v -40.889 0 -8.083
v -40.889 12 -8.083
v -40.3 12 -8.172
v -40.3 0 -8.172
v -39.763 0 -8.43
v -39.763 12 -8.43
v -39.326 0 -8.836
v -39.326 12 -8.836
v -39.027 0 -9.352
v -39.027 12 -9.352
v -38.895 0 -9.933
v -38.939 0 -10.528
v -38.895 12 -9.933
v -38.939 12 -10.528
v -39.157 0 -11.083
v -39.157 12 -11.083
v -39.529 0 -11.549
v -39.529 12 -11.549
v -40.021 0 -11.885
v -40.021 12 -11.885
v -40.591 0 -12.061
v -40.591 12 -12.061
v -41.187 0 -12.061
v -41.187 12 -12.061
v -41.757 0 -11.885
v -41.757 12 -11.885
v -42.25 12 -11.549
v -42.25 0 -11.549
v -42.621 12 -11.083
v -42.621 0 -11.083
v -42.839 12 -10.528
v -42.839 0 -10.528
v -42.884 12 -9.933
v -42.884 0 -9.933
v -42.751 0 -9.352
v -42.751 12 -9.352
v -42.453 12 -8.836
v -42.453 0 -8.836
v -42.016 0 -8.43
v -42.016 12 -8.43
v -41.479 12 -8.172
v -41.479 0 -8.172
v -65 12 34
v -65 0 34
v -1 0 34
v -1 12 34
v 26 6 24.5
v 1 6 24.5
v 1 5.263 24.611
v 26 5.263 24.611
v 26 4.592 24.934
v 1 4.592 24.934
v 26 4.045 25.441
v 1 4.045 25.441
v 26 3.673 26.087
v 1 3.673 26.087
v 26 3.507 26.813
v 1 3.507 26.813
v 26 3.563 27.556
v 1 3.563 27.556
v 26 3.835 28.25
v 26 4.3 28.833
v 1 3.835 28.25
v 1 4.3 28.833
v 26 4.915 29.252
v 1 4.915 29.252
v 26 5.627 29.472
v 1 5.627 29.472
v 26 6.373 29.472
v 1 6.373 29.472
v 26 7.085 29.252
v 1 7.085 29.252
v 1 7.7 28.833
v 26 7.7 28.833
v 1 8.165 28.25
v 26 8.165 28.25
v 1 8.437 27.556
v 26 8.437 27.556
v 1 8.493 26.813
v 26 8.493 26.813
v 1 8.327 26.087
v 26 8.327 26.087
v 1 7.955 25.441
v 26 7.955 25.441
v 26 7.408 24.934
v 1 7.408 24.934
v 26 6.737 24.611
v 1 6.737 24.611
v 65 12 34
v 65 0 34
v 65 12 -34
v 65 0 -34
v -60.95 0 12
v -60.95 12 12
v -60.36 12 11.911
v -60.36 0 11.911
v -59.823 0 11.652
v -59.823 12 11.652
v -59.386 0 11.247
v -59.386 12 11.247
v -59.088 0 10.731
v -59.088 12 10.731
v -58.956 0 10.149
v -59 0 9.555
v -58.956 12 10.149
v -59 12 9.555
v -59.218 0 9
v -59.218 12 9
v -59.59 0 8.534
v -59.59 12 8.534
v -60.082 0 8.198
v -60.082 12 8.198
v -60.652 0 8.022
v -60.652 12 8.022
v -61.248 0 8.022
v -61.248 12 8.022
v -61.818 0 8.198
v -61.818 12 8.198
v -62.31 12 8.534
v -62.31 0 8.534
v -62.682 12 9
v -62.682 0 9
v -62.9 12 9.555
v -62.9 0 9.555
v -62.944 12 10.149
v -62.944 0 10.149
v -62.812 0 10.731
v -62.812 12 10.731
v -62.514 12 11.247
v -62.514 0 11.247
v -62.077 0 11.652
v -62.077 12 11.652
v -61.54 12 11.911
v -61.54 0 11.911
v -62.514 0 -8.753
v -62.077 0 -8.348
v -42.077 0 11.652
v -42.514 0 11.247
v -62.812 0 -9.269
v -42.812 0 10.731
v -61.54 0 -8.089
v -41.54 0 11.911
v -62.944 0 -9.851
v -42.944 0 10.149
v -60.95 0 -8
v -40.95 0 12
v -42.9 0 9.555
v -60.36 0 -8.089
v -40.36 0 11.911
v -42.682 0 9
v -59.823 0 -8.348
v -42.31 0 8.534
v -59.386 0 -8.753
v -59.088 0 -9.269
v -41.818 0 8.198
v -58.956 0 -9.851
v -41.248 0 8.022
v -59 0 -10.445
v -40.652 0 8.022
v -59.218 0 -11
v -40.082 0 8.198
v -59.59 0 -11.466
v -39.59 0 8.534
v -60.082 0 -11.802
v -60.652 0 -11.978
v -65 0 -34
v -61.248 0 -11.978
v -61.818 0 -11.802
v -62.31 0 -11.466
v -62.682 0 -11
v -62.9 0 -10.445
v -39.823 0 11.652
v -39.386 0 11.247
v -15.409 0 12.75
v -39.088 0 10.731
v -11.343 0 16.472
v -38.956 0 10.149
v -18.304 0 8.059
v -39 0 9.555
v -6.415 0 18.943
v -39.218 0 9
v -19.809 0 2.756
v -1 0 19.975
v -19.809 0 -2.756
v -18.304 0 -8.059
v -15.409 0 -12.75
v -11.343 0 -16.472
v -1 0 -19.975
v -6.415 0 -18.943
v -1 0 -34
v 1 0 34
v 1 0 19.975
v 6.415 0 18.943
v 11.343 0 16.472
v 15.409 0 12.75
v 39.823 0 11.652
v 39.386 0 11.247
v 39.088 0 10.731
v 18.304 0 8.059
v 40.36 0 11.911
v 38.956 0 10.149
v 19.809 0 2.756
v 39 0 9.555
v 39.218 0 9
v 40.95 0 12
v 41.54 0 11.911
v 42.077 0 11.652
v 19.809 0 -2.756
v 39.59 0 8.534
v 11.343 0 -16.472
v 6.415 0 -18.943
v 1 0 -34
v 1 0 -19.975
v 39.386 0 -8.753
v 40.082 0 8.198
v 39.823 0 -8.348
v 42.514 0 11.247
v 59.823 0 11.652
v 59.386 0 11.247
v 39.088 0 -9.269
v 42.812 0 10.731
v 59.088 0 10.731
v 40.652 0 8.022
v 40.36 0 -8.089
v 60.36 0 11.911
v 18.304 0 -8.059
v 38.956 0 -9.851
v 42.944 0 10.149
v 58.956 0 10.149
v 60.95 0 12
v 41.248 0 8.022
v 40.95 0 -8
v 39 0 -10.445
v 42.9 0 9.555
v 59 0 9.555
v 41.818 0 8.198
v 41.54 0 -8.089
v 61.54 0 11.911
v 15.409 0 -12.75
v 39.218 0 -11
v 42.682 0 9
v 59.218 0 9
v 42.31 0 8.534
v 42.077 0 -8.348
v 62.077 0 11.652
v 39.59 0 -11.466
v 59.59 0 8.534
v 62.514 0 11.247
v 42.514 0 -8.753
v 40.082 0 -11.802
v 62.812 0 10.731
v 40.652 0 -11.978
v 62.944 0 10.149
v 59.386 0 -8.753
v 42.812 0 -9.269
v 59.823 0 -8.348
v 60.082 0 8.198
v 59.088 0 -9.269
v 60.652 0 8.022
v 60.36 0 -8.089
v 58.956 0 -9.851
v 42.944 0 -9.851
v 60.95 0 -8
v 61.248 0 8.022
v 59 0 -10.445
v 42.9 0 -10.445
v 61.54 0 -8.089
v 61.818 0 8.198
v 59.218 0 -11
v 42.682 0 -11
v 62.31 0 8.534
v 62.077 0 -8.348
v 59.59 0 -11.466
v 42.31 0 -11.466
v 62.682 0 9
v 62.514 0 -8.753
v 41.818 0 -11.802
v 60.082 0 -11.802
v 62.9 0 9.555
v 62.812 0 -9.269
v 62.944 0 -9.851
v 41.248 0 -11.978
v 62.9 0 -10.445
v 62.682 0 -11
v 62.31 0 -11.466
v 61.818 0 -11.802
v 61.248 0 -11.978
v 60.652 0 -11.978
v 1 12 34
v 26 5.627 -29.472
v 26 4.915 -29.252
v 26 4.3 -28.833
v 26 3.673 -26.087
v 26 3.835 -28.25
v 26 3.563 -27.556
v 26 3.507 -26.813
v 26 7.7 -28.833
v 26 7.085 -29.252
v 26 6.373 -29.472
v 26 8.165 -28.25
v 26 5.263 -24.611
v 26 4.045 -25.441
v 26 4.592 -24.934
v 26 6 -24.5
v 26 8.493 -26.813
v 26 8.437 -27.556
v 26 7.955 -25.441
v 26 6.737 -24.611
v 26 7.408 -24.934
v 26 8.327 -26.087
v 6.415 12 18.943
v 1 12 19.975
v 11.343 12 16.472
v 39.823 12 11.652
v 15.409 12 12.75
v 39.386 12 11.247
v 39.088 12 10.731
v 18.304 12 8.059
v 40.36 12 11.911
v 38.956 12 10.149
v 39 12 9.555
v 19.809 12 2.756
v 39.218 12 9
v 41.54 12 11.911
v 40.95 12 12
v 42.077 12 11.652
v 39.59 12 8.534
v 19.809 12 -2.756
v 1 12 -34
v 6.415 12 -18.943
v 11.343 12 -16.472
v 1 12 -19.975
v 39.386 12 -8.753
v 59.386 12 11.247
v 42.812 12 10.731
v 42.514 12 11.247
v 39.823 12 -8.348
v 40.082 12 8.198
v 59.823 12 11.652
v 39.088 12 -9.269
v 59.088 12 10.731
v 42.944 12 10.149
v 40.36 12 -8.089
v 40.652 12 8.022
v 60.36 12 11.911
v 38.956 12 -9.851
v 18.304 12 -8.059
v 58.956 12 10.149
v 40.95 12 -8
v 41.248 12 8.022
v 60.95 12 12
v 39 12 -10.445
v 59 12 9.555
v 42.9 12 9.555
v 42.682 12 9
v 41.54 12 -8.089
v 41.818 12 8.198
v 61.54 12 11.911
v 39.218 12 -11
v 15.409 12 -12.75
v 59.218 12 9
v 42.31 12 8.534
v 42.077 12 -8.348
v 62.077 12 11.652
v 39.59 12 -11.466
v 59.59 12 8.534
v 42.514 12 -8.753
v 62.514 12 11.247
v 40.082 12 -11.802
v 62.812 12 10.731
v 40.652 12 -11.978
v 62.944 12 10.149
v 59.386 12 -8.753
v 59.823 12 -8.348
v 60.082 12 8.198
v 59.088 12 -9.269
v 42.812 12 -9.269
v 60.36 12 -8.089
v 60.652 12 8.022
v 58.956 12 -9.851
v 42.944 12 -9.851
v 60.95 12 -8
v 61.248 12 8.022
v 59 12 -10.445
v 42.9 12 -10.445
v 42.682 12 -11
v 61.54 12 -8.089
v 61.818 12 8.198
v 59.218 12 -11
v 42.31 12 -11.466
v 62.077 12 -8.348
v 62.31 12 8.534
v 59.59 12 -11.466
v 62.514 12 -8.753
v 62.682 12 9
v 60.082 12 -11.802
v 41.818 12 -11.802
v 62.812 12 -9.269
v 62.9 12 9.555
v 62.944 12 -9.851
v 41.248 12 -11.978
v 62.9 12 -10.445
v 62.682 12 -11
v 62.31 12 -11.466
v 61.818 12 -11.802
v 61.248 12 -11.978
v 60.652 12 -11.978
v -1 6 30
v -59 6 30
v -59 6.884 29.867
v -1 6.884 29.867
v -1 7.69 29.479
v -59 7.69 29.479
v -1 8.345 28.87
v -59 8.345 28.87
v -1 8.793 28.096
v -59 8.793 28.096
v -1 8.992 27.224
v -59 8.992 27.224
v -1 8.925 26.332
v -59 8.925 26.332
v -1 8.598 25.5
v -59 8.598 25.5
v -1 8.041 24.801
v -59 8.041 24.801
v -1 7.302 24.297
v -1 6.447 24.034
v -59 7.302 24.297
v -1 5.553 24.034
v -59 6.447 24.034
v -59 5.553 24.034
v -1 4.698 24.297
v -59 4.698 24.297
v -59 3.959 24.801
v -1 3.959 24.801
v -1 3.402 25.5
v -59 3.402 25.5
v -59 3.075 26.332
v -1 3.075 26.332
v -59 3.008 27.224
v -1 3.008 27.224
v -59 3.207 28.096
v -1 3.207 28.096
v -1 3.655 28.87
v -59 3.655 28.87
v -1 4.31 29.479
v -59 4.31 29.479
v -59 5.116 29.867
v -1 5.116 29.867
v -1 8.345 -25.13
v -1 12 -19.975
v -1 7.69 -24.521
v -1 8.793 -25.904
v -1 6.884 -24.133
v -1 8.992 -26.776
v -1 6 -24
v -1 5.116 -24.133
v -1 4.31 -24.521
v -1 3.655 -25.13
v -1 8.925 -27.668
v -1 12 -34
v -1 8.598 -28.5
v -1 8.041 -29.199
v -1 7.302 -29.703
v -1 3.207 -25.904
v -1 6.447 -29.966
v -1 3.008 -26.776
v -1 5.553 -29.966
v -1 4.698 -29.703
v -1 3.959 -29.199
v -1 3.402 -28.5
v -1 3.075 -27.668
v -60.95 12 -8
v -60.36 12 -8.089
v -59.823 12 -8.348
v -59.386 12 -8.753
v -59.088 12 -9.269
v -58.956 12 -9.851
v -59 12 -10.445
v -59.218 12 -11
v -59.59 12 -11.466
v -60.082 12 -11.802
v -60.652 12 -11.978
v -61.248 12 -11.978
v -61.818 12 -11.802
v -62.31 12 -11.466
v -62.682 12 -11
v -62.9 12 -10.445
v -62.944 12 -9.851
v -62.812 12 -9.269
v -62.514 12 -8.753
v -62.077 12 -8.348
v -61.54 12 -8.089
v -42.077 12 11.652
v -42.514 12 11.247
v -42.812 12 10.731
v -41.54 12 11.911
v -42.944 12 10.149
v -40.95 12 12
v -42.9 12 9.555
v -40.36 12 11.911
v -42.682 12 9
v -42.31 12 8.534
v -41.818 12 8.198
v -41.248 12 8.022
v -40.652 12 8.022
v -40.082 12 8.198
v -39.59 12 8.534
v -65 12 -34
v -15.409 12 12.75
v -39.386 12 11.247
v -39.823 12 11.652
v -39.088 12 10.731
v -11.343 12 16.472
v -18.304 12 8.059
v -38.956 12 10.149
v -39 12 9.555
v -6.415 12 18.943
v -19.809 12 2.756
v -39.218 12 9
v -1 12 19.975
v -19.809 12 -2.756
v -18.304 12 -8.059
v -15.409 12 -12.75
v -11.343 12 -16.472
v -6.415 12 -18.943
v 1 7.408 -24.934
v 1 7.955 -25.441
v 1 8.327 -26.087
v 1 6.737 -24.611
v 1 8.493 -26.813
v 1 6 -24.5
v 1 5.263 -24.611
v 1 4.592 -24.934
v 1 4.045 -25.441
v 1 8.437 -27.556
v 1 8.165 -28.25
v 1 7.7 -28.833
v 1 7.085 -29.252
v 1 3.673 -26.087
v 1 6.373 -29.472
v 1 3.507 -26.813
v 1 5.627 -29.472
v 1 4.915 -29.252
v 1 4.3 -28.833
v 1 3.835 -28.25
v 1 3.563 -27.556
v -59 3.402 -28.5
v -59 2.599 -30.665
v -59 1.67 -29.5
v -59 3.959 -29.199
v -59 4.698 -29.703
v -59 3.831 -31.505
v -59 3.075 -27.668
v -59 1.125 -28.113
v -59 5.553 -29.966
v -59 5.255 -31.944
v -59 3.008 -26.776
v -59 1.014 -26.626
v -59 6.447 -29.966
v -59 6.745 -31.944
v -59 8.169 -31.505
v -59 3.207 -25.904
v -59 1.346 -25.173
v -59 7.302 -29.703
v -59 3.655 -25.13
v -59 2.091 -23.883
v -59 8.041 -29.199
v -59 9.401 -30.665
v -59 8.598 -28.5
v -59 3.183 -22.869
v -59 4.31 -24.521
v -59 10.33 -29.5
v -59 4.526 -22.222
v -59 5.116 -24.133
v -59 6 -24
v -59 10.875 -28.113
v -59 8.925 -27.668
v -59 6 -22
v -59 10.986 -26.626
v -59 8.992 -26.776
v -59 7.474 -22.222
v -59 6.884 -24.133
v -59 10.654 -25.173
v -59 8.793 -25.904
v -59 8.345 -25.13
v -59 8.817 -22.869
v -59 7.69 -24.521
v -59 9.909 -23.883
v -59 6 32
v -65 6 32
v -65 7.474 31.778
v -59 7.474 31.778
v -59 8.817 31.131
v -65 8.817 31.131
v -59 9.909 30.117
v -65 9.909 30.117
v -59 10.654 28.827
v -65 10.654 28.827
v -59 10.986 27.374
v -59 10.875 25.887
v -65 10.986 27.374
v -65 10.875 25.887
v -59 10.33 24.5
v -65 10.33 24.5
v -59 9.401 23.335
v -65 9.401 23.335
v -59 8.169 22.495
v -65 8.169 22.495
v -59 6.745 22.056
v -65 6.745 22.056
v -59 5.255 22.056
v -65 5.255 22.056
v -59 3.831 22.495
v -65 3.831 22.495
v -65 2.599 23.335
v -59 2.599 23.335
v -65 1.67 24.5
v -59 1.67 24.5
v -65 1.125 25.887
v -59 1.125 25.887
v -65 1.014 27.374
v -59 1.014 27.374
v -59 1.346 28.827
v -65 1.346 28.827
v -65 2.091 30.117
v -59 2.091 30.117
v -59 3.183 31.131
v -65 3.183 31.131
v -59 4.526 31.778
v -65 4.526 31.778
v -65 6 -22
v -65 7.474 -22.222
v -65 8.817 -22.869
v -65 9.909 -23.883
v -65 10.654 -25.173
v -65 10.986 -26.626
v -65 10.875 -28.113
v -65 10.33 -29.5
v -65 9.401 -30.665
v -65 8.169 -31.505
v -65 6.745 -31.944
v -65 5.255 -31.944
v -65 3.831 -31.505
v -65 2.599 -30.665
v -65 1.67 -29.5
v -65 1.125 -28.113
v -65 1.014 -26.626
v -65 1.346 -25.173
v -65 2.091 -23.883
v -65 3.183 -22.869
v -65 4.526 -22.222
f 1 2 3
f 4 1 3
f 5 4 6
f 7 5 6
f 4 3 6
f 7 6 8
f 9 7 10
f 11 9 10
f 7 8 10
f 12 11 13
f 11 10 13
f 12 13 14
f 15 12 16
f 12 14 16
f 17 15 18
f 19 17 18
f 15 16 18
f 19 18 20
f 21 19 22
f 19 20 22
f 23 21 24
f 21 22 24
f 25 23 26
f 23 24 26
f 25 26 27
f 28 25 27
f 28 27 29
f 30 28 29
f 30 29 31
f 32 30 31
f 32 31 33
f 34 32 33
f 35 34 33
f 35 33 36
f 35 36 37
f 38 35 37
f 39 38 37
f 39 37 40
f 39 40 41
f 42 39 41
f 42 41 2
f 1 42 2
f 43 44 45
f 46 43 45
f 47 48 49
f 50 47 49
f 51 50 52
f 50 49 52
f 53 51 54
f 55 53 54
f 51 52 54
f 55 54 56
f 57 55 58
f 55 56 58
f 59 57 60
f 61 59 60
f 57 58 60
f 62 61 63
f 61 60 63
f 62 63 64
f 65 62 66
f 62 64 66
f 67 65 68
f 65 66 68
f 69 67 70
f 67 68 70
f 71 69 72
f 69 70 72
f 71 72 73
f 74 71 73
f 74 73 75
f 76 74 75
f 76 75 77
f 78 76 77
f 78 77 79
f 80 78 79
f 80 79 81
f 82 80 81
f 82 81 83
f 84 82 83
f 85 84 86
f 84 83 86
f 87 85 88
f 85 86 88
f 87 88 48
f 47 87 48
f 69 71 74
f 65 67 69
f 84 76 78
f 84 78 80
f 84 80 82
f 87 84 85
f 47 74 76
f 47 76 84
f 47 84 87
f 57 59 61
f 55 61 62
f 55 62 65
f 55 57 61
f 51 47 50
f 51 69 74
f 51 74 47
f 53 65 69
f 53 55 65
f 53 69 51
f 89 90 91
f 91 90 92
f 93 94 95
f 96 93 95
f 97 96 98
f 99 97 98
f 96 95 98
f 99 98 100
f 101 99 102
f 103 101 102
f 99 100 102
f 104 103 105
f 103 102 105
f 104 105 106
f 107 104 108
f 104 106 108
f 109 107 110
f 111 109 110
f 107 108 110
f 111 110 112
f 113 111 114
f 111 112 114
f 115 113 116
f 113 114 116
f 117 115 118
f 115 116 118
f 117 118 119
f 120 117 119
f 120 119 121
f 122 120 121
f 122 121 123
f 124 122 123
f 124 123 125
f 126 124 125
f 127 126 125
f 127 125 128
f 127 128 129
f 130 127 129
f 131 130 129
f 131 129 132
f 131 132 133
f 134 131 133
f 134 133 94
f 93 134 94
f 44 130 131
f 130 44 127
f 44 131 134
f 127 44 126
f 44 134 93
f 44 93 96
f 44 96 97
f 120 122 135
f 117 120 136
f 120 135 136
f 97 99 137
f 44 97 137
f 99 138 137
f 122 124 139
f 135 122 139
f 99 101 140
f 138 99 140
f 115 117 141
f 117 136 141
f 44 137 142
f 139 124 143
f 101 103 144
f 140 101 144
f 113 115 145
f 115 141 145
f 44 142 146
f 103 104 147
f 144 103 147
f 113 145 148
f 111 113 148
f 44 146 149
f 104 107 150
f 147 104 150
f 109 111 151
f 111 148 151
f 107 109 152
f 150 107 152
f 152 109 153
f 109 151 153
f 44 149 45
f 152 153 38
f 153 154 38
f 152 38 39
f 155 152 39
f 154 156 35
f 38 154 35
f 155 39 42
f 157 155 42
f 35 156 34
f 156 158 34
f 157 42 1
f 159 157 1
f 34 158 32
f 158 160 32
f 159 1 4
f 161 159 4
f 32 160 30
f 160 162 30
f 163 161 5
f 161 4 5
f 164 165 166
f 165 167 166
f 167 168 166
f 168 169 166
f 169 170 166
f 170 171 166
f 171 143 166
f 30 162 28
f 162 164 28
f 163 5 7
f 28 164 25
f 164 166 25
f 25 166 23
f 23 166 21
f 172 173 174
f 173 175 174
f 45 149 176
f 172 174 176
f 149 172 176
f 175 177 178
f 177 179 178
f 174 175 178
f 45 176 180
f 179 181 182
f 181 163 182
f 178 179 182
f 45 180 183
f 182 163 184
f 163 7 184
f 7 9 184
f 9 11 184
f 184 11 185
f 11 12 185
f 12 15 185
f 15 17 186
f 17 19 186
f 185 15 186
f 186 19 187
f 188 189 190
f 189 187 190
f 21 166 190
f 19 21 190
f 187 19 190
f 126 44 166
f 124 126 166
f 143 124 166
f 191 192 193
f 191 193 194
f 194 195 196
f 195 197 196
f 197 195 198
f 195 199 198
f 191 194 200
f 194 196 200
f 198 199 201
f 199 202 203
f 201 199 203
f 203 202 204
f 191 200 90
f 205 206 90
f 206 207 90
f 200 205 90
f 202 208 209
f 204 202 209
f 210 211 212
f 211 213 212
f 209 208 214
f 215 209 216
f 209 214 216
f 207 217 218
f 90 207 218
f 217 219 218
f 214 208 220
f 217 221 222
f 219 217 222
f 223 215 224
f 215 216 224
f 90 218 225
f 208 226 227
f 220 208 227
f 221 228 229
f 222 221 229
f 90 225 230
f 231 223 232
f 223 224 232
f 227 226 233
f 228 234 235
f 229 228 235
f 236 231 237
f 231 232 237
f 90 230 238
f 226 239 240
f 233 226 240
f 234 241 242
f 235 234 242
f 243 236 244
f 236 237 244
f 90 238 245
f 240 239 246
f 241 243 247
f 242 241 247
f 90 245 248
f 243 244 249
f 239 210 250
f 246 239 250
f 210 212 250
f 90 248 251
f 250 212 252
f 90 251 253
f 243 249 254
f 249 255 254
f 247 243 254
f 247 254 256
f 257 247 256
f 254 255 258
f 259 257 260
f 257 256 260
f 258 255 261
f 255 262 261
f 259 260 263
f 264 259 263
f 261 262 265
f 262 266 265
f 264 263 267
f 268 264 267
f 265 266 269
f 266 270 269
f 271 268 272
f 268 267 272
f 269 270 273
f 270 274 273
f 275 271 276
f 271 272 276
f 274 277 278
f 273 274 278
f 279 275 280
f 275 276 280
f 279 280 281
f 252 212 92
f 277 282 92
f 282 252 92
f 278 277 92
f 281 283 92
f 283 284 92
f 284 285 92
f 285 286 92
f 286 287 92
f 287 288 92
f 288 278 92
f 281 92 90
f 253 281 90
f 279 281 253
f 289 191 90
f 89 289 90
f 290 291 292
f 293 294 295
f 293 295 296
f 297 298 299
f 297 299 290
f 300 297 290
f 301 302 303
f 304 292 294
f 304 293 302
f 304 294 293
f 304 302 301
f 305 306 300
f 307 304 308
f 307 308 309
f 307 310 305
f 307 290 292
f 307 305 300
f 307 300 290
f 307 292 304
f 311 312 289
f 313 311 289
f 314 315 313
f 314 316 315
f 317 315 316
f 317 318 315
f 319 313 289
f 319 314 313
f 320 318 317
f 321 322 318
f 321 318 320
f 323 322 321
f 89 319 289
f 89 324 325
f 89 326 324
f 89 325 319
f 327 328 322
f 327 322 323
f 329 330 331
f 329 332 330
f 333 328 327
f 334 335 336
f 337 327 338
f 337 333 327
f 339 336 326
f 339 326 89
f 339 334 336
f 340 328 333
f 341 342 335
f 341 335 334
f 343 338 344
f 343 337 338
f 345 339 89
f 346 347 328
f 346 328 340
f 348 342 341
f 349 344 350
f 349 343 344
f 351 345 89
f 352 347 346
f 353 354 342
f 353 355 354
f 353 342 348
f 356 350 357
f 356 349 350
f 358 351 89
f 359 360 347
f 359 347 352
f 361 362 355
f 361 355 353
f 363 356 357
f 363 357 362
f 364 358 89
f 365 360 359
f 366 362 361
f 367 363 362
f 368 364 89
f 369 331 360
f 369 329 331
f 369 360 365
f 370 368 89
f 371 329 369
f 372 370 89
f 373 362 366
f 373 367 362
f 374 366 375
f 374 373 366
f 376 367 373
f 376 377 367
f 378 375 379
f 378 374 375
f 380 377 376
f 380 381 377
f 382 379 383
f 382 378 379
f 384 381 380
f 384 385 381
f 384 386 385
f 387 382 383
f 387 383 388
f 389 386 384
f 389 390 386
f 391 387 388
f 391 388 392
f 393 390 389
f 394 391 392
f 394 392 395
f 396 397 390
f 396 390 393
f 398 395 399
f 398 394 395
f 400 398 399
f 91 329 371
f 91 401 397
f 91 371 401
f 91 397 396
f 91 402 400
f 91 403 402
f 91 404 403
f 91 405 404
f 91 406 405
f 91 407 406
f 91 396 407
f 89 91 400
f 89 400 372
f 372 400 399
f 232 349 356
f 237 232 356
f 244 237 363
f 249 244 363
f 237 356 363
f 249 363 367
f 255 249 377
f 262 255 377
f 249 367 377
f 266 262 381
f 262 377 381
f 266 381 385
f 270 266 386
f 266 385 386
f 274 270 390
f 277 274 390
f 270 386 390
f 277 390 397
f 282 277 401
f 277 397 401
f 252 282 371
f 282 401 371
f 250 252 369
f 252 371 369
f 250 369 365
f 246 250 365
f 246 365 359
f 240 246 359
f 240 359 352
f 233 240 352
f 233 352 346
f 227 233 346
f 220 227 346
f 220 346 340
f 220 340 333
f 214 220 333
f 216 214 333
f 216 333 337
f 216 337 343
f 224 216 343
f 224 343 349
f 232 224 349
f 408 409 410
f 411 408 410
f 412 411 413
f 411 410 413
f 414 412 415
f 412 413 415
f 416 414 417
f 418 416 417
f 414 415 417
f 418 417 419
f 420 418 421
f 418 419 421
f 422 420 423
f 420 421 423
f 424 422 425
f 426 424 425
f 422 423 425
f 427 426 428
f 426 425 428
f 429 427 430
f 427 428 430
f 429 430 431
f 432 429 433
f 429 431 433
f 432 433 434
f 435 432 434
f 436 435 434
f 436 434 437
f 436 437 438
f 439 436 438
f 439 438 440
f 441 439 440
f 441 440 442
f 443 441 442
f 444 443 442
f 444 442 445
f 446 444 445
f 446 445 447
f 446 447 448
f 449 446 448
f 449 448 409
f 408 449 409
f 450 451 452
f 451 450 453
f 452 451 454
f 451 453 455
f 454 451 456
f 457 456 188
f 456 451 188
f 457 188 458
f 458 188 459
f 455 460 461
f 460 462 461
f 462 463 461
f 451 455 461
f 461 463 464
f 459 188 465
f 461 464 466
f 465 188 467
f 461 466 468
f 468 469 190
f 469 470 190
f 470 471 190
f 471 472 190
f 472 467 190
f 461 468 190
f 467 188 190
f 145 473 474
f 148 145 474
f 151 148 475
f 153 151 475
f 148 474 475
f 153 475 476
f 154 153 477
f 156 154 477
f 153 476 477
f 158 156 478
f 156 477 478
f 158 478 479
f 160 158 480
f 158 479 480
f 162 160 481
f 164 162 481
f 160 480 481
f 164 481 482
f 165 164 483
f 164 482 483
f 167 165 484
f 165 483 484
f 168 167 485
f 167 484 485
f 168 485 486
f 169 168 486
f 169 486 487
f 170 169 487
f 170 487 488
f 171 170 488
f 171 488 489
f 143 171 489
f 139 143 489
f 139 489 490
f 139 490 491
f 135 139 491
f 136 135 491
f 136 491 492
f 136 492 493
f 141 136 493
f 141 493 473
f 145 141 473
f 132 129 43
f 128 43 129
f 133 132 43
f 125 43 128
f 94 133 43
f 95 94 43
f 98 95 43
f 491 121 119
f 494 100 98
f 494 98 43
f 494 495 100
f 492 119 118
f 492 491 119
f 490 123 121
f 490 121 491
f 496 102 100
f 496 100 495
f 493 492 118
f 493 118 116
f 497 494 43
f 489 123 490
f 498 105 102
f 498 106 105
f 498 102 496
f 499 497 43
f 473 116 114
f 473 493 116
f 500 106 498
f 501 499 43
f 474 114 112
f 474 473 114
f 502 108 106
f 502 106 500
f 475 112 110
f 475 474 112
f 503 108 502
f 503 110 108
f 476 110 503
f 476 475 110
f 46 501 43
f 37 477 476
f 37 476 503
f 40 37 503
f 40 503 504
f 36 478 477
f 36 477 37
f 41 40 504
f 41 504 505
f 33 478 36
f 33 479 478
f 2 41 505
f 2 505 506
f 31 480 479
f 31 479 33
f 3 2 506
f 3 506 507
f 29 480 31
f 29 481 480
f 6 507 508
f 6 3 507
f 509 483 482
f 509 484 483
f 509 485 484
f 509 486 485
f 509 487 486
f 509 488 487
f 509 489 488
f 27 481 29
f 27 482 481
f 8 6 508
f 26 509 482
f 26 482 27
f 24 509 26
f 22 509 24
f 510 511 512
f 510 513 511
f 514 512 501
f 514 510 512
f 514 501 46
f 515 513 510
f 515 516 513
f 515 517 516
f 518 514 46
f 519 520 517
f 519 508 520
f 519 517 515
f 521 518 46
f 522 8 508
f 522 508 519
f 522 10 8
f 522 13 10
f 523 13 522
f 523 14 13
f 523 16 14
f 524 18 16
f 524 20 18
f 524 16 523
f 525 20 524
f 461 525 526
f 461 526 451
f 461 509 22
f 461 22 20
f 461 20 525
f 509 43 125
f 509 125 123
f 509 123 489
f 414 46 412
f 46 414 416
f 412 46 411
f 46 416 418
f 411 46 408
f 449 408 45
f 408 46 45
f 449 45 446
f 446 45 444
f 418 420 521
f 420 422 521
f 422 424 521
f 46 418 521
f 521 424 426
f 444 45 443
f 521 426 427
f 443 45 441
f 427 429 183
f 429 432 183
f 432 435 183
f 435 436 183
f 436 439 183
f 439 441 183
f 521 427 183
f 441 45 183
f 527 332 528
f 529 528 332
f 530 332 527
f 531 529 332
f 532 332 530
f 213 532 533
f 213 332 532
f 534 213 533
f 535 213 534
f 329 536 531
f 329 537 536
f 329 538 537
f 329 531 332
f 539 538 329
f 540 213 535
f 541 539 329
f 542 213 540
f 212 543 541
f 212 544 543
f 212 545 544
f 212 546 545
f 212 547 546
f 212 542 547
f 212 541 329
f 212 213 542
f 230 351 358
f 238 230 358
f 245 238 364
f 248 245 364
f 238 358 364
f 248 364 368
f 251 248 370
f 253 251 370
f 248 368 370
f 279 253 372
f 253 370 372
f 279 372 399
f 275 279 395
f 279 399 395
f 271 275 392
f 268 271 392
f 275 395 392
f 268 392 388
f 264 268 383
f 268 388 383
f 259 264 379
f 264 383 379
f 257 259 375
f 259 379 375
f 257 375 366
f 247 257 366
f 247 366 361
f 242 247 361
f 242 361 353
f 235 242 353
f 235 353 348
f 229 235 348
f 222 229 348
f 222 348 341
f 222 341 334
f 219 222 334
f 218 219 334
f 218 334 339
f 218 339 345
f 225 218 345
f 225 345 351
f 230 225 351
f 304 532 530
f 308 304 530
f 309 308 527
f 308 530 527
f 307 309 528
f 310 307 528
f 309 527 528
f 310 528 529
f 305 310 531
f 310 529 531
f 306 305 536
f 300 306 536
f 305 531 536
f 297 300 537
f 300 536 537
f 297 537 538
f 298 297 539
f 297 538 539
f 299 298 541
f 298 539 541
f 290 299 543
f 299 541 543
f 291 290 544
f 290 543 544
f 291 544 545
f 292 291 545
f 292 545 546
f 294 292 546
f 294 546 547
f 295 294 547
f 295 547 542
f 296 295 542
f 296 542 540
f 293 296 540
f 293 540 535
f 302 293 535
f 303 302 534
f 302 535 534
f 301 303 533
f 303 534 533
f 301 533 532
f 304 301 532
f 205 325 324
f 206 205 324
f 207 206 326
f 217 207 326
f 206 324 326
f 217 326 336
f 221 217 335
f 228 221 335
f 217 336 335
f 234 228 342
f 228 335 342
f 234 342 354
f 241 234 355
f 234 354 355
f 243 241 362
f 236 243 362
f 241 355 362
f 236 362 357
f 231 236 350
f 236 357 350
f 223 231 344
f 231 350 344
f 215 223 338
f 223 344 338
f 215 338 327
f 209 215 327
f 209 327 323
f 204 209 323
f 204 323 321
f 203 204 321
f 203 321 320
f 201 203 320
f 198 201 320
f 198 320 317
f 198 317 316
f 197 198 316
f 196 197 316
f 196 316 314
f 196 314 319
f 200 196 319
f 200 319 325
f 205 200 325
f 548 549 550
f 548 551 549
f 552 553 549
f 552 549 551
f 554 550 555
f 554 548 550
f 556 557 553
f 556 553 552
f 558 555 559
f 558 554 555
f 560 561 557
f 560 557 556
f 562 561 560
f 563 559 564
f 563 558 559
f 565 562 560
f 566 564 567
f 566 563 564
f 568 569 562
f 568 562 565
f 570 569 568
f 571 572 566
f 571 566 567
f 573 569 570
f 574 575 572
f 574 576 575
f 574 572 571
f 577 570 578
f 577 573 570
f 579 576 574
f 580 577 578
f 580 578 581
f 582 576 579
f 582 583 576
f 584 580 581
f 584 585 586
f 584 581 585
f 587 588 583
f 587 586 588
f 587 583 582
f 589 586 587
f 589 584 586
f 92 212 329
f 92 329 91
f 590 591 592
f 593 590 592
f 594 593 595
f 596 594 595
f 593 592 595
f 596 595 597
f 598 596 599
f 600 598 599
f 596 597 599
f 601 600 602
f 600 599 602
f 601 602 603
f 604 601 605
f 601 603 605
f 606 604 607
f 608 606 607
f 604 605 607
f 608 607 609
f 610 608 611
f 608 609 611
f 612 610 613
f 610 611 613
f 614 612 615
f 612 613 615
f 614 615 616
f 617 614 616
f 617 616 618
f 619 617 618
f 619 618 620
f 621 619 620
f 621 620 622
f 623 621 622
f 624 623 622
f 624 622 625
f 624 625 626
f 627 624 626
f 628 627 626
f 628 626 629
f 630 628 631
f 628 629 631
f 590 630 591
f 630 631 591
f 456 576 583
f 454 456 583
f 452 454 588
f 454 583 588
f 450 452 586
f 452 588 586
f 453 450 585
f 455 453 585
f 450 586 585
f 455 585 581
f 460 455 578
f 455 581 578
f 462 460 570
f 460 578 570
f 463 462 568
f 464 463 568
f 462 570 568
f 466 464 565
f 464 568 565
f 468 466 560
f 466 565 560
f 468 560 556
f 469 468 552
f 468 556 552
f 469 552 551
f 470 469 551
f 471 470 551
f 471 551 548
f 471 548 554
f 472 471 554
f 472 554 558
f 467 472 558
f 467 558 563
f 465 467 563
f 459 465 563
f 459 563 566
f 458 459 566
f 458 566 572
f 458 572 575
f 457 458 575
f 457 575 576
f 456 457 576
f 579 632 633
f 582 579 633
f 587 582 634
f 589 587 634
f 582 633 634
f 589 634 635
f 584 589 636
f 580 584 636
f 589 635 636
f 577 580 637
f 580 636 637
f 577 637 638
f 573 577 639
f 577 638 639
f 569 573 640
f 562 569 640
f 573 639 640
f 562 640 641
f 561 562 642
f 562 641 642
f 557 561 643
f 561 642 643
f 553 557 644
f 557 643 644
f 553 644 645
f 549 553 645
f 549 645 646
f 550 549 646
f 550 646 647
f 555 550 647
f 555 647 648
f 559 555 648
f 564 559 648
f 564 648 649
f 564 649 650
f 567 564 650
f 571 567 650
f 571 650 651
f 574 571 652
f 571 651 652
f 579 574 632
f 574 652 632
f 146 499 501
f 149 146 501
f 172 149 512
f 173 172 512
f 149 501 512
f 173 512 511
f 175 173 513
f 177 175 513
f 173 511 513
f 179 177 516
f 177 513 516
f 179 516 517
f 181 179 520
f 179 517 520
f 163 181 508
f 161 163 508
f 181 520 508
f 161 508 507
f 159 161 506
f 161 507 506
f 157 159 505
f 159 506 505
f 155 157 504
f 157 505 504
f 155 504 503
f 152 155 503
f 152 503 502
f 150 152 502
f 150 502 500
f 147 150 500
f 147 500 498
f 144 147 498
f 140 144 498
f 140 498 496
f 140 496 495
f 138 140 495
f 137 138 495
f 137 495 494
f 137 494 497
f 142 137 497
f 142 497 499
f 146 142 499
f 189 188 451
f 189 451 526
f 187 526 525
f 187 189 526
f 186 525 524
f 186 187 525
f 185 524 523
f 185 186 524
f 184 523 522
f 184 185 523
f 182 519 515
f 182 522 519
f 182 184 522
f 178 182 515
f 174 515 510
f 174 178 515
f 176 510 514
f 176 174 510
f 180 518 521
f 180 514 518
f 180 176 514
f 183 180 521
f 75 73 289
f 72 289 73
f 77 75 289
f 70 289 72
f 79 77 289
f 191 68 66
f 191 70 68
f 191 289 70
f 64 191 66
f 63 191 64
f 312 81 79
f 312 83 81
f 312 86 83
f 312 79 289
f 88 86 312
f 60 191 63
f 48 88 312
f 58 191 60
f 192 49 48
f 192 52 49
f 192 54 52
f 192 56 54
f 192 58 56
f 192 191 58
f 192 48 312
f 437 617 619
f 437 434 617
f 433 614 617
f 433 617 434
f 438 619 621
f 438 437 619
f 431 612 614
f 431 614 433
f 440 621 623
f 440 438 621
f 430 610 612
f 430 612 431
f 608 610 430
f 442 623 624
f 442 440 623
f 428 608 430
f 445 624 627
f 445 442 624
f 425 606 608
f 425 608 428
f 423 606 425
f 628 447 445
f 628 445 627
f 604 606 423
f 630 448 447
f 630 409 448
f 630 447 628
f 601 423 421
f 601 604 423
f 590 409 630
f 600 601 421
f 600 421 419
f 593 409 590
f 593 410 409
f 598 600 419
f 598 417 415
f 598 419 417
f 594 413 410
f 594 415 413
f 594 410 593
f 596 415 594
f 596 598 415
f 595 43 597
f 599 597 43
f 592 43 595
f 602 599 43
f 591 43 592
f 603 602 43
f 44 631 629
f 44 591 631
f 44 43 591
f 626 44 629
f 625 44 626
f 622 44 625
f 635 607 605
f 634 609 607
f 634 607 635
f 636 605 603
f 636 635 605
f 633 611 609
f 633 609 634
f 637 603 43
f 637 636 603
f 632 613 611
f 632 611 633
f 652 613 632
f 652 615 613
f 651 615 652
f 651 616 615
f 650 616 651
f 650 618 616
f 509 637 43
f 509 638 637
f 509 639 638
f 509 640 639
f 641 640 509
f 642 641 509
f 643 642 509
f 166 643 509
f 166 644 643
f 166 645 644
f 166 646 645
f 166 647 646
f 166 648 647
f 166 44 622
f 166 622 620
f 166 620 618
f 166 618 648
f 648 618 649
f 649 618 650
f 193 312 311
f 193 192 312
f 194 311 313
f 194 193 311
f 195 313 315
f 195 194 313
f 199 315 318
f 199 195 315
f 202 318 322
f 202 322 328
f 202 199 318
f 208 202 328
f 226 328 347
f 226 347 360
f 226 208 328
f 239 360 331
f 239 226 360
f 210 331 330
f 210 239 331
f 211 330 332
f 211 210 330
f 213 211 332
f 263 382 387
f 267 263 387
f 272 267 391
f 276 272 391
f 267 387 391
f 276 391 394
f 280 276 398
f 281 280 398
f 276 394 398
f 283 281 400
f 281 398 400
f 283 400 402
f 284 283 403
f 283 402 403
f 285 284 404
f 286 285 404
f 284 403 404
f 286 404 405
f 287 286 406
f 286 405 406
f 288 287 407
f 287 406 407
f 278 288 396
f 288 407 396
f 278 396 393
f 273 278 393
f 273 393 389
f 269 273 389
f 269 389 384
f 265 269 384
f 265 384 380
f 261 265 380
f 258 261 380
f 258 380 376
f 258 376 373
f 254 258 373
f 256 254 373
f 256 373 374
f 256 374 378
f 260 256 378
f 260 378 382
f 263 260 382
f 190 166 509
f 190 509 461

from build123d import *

# Parameters (mm, degrees)
SKETCH1_W             = 64
SKETCH1_H             = 68
BOSS_EXTRUDE1_DEPTH   = 12
BOSS_EXTRUDE1_2_DEPTH = 12
SKETCH2_R             = 20
CUT_EXTRUDE1_DEPTH    = 75.330343737
SKETCH3_R             = 2
CUT_EXTRUDE2_DEPTH    = 75.330343737
SKETCH5_R             = 2
CUT_EXTRUDE3_DEPTH    = 75.330343737
SKETCH6_R             = 3
CUT_EXTRUDE4_DEPTH    = 64
SKETCH7_R             = 5
CUT_EXTRUDE5_DEPTH    = 6
SKETCH8_R             = 2.5
CUT_EXTRUDE6_DEPTH    = 25


with BuildPart() as part:
    # Sketch1 → Boss-Extrude1 (new body)
    with BuildSketch(Plane(origin=(0, 0, 0), x_dir=(1, 0, 0), z_dir=(0, 1, 0))):
        with Locations((33, 0)):
            Rectangle(SKETCH1_W, SKETCH1_H)
    extrude(amount=BOSS_EXTRUDE1_DEPTH)


with BuildPart() as body_2:
    # Sketch1 → Boss-Extrude1 2 (new body)
    with BuildSketch(Plane(origin=(0, 0, 0), x_dir=(1, 0, 0), z_dir=(0, 1, 0))):
        with Locations((-33, 0)):
            Rectangle(SKETCH1_W, SKETCH1_H)
    extrude(amount=BOSS_EXTRUDE1_2_DEPTH)


with BuildPart() as cut_extrude1_tool:
    # Sketch2 → Cut-Extrude1 (new, through all)
    with BuildSketch(Plane(origin=(0, 0, 0), x_dir=(1, 0, 0), z_dir=(0, 1, 0))):
        Circle(SKETCH2_R)
    extrude(amount=CUT_EXTRUDE1_DEPTH)


with BuildPart() as part_1:
    add(part.part)

    # Cut-Extrude1: cut by cut_extrude1_tool
    add(cut_extrude1_tool.part, mode=Mode.SUBTRACT)

    # Sketch5 → Cut-Extrude3 (cut, through all)
    with BuildSketch(Plane(origin=(0, 12, 0), x_dir=(1, 0, 0), z_dir=(0, 1, 0))):
        with Locations(Location((40.95, 10, 0), (0, 0, 270))):
            Circle(SKETCH5_R)
        with Locations(Location((60.95, 10, 0), (0, 0, 270))):
            Circle(SKETCH5_R)
        with Locations(Location((60.95, -10, 0), (0, 0, 270))):
            Circle(SKETCH5_R)
        with Locations(Location((40.95, -10, 0), (0, 0, 270))):
            Circle(SKETCH5_R)
    extrude(amount=-CUT_EXTRUDE3_DEPTH, mode=Mode.SUBTRACT)

    # Sketch8 → Cut-Extrude6 (cut)
    with BuildSketch(Plane.ZY.offset(-1)):
        with Locations((-27, 6)):
            Circle(SKETCH8_R)
        with Locations(Location((27, 6, 0), (0, 0, 180))):
            Circle(SKETCH8_R)
    extrude(amount=-CUT_EXTRUDE6_DEPTH, mode=Mode.SUBTRACT)


with BuildPart() as body_2_1:
    add(body_2.part)

    # Cut-Extrude1: cut by cut_extrude1_tool
    add(cut_extrude1_tool.part, mode=Mode.SUBTRACT)

    # Sketch3 → Cut-Extrude2 (cut, through all)
    with BuildSketch(Plane(origin=(0, 12, 0), x_dir=(1, 0, 0), z_dir=(0, 1, 0))):
        with Locations(Location((-60.95, 10, 0), (0, 0, 270))):
            Circle(SKETCH3_R)
        with Locations(Location((-40.889177155, 10.082916262, 0), (0, 0, 270))):
            Circle(SKETCH3_R)
        with Locations(Location((-40.95, -10, 0), (0, 0, 270))):
            Circle(SKETCH3_R)
        with Locations(Location((-60.95, -10, 0), (0, 0, 270))):
            Circle(SKETCH3_R)
    extrude(amount=-CUT_EXTRUDE2_DEPTH, mode=Mode.SUBTRACT)

    # Sketch6 → Cut-Extrude4 (cut)
    with BuildSketch(Plane.ZY.offset(65)):
        with Locations((-27, 6)):
            Circle(SKETCH6_R)
        with Locations((27, 6)):
            Circle(SKETCH6_R)
    extrude(amount=-CUT_EXTRUDE4_DEPTH, mode=Mode.SUBTRACT)

    # Sketch7 → Cut-Extrude5 (cut)
    with BuildSketch(Plane.ZY.offset(65)):
        with Locations((-27, 6)):
            Circle(SKETCH7_R)
        with Locations((27, 6)):
            Circle(SKETCH7_R)
    extrude(amount=-CUT_EXTRUDE5_DEPTH, mode=Mode.SUBTRACT)


solid = Compound([part_1.part, body_2_1.part])
